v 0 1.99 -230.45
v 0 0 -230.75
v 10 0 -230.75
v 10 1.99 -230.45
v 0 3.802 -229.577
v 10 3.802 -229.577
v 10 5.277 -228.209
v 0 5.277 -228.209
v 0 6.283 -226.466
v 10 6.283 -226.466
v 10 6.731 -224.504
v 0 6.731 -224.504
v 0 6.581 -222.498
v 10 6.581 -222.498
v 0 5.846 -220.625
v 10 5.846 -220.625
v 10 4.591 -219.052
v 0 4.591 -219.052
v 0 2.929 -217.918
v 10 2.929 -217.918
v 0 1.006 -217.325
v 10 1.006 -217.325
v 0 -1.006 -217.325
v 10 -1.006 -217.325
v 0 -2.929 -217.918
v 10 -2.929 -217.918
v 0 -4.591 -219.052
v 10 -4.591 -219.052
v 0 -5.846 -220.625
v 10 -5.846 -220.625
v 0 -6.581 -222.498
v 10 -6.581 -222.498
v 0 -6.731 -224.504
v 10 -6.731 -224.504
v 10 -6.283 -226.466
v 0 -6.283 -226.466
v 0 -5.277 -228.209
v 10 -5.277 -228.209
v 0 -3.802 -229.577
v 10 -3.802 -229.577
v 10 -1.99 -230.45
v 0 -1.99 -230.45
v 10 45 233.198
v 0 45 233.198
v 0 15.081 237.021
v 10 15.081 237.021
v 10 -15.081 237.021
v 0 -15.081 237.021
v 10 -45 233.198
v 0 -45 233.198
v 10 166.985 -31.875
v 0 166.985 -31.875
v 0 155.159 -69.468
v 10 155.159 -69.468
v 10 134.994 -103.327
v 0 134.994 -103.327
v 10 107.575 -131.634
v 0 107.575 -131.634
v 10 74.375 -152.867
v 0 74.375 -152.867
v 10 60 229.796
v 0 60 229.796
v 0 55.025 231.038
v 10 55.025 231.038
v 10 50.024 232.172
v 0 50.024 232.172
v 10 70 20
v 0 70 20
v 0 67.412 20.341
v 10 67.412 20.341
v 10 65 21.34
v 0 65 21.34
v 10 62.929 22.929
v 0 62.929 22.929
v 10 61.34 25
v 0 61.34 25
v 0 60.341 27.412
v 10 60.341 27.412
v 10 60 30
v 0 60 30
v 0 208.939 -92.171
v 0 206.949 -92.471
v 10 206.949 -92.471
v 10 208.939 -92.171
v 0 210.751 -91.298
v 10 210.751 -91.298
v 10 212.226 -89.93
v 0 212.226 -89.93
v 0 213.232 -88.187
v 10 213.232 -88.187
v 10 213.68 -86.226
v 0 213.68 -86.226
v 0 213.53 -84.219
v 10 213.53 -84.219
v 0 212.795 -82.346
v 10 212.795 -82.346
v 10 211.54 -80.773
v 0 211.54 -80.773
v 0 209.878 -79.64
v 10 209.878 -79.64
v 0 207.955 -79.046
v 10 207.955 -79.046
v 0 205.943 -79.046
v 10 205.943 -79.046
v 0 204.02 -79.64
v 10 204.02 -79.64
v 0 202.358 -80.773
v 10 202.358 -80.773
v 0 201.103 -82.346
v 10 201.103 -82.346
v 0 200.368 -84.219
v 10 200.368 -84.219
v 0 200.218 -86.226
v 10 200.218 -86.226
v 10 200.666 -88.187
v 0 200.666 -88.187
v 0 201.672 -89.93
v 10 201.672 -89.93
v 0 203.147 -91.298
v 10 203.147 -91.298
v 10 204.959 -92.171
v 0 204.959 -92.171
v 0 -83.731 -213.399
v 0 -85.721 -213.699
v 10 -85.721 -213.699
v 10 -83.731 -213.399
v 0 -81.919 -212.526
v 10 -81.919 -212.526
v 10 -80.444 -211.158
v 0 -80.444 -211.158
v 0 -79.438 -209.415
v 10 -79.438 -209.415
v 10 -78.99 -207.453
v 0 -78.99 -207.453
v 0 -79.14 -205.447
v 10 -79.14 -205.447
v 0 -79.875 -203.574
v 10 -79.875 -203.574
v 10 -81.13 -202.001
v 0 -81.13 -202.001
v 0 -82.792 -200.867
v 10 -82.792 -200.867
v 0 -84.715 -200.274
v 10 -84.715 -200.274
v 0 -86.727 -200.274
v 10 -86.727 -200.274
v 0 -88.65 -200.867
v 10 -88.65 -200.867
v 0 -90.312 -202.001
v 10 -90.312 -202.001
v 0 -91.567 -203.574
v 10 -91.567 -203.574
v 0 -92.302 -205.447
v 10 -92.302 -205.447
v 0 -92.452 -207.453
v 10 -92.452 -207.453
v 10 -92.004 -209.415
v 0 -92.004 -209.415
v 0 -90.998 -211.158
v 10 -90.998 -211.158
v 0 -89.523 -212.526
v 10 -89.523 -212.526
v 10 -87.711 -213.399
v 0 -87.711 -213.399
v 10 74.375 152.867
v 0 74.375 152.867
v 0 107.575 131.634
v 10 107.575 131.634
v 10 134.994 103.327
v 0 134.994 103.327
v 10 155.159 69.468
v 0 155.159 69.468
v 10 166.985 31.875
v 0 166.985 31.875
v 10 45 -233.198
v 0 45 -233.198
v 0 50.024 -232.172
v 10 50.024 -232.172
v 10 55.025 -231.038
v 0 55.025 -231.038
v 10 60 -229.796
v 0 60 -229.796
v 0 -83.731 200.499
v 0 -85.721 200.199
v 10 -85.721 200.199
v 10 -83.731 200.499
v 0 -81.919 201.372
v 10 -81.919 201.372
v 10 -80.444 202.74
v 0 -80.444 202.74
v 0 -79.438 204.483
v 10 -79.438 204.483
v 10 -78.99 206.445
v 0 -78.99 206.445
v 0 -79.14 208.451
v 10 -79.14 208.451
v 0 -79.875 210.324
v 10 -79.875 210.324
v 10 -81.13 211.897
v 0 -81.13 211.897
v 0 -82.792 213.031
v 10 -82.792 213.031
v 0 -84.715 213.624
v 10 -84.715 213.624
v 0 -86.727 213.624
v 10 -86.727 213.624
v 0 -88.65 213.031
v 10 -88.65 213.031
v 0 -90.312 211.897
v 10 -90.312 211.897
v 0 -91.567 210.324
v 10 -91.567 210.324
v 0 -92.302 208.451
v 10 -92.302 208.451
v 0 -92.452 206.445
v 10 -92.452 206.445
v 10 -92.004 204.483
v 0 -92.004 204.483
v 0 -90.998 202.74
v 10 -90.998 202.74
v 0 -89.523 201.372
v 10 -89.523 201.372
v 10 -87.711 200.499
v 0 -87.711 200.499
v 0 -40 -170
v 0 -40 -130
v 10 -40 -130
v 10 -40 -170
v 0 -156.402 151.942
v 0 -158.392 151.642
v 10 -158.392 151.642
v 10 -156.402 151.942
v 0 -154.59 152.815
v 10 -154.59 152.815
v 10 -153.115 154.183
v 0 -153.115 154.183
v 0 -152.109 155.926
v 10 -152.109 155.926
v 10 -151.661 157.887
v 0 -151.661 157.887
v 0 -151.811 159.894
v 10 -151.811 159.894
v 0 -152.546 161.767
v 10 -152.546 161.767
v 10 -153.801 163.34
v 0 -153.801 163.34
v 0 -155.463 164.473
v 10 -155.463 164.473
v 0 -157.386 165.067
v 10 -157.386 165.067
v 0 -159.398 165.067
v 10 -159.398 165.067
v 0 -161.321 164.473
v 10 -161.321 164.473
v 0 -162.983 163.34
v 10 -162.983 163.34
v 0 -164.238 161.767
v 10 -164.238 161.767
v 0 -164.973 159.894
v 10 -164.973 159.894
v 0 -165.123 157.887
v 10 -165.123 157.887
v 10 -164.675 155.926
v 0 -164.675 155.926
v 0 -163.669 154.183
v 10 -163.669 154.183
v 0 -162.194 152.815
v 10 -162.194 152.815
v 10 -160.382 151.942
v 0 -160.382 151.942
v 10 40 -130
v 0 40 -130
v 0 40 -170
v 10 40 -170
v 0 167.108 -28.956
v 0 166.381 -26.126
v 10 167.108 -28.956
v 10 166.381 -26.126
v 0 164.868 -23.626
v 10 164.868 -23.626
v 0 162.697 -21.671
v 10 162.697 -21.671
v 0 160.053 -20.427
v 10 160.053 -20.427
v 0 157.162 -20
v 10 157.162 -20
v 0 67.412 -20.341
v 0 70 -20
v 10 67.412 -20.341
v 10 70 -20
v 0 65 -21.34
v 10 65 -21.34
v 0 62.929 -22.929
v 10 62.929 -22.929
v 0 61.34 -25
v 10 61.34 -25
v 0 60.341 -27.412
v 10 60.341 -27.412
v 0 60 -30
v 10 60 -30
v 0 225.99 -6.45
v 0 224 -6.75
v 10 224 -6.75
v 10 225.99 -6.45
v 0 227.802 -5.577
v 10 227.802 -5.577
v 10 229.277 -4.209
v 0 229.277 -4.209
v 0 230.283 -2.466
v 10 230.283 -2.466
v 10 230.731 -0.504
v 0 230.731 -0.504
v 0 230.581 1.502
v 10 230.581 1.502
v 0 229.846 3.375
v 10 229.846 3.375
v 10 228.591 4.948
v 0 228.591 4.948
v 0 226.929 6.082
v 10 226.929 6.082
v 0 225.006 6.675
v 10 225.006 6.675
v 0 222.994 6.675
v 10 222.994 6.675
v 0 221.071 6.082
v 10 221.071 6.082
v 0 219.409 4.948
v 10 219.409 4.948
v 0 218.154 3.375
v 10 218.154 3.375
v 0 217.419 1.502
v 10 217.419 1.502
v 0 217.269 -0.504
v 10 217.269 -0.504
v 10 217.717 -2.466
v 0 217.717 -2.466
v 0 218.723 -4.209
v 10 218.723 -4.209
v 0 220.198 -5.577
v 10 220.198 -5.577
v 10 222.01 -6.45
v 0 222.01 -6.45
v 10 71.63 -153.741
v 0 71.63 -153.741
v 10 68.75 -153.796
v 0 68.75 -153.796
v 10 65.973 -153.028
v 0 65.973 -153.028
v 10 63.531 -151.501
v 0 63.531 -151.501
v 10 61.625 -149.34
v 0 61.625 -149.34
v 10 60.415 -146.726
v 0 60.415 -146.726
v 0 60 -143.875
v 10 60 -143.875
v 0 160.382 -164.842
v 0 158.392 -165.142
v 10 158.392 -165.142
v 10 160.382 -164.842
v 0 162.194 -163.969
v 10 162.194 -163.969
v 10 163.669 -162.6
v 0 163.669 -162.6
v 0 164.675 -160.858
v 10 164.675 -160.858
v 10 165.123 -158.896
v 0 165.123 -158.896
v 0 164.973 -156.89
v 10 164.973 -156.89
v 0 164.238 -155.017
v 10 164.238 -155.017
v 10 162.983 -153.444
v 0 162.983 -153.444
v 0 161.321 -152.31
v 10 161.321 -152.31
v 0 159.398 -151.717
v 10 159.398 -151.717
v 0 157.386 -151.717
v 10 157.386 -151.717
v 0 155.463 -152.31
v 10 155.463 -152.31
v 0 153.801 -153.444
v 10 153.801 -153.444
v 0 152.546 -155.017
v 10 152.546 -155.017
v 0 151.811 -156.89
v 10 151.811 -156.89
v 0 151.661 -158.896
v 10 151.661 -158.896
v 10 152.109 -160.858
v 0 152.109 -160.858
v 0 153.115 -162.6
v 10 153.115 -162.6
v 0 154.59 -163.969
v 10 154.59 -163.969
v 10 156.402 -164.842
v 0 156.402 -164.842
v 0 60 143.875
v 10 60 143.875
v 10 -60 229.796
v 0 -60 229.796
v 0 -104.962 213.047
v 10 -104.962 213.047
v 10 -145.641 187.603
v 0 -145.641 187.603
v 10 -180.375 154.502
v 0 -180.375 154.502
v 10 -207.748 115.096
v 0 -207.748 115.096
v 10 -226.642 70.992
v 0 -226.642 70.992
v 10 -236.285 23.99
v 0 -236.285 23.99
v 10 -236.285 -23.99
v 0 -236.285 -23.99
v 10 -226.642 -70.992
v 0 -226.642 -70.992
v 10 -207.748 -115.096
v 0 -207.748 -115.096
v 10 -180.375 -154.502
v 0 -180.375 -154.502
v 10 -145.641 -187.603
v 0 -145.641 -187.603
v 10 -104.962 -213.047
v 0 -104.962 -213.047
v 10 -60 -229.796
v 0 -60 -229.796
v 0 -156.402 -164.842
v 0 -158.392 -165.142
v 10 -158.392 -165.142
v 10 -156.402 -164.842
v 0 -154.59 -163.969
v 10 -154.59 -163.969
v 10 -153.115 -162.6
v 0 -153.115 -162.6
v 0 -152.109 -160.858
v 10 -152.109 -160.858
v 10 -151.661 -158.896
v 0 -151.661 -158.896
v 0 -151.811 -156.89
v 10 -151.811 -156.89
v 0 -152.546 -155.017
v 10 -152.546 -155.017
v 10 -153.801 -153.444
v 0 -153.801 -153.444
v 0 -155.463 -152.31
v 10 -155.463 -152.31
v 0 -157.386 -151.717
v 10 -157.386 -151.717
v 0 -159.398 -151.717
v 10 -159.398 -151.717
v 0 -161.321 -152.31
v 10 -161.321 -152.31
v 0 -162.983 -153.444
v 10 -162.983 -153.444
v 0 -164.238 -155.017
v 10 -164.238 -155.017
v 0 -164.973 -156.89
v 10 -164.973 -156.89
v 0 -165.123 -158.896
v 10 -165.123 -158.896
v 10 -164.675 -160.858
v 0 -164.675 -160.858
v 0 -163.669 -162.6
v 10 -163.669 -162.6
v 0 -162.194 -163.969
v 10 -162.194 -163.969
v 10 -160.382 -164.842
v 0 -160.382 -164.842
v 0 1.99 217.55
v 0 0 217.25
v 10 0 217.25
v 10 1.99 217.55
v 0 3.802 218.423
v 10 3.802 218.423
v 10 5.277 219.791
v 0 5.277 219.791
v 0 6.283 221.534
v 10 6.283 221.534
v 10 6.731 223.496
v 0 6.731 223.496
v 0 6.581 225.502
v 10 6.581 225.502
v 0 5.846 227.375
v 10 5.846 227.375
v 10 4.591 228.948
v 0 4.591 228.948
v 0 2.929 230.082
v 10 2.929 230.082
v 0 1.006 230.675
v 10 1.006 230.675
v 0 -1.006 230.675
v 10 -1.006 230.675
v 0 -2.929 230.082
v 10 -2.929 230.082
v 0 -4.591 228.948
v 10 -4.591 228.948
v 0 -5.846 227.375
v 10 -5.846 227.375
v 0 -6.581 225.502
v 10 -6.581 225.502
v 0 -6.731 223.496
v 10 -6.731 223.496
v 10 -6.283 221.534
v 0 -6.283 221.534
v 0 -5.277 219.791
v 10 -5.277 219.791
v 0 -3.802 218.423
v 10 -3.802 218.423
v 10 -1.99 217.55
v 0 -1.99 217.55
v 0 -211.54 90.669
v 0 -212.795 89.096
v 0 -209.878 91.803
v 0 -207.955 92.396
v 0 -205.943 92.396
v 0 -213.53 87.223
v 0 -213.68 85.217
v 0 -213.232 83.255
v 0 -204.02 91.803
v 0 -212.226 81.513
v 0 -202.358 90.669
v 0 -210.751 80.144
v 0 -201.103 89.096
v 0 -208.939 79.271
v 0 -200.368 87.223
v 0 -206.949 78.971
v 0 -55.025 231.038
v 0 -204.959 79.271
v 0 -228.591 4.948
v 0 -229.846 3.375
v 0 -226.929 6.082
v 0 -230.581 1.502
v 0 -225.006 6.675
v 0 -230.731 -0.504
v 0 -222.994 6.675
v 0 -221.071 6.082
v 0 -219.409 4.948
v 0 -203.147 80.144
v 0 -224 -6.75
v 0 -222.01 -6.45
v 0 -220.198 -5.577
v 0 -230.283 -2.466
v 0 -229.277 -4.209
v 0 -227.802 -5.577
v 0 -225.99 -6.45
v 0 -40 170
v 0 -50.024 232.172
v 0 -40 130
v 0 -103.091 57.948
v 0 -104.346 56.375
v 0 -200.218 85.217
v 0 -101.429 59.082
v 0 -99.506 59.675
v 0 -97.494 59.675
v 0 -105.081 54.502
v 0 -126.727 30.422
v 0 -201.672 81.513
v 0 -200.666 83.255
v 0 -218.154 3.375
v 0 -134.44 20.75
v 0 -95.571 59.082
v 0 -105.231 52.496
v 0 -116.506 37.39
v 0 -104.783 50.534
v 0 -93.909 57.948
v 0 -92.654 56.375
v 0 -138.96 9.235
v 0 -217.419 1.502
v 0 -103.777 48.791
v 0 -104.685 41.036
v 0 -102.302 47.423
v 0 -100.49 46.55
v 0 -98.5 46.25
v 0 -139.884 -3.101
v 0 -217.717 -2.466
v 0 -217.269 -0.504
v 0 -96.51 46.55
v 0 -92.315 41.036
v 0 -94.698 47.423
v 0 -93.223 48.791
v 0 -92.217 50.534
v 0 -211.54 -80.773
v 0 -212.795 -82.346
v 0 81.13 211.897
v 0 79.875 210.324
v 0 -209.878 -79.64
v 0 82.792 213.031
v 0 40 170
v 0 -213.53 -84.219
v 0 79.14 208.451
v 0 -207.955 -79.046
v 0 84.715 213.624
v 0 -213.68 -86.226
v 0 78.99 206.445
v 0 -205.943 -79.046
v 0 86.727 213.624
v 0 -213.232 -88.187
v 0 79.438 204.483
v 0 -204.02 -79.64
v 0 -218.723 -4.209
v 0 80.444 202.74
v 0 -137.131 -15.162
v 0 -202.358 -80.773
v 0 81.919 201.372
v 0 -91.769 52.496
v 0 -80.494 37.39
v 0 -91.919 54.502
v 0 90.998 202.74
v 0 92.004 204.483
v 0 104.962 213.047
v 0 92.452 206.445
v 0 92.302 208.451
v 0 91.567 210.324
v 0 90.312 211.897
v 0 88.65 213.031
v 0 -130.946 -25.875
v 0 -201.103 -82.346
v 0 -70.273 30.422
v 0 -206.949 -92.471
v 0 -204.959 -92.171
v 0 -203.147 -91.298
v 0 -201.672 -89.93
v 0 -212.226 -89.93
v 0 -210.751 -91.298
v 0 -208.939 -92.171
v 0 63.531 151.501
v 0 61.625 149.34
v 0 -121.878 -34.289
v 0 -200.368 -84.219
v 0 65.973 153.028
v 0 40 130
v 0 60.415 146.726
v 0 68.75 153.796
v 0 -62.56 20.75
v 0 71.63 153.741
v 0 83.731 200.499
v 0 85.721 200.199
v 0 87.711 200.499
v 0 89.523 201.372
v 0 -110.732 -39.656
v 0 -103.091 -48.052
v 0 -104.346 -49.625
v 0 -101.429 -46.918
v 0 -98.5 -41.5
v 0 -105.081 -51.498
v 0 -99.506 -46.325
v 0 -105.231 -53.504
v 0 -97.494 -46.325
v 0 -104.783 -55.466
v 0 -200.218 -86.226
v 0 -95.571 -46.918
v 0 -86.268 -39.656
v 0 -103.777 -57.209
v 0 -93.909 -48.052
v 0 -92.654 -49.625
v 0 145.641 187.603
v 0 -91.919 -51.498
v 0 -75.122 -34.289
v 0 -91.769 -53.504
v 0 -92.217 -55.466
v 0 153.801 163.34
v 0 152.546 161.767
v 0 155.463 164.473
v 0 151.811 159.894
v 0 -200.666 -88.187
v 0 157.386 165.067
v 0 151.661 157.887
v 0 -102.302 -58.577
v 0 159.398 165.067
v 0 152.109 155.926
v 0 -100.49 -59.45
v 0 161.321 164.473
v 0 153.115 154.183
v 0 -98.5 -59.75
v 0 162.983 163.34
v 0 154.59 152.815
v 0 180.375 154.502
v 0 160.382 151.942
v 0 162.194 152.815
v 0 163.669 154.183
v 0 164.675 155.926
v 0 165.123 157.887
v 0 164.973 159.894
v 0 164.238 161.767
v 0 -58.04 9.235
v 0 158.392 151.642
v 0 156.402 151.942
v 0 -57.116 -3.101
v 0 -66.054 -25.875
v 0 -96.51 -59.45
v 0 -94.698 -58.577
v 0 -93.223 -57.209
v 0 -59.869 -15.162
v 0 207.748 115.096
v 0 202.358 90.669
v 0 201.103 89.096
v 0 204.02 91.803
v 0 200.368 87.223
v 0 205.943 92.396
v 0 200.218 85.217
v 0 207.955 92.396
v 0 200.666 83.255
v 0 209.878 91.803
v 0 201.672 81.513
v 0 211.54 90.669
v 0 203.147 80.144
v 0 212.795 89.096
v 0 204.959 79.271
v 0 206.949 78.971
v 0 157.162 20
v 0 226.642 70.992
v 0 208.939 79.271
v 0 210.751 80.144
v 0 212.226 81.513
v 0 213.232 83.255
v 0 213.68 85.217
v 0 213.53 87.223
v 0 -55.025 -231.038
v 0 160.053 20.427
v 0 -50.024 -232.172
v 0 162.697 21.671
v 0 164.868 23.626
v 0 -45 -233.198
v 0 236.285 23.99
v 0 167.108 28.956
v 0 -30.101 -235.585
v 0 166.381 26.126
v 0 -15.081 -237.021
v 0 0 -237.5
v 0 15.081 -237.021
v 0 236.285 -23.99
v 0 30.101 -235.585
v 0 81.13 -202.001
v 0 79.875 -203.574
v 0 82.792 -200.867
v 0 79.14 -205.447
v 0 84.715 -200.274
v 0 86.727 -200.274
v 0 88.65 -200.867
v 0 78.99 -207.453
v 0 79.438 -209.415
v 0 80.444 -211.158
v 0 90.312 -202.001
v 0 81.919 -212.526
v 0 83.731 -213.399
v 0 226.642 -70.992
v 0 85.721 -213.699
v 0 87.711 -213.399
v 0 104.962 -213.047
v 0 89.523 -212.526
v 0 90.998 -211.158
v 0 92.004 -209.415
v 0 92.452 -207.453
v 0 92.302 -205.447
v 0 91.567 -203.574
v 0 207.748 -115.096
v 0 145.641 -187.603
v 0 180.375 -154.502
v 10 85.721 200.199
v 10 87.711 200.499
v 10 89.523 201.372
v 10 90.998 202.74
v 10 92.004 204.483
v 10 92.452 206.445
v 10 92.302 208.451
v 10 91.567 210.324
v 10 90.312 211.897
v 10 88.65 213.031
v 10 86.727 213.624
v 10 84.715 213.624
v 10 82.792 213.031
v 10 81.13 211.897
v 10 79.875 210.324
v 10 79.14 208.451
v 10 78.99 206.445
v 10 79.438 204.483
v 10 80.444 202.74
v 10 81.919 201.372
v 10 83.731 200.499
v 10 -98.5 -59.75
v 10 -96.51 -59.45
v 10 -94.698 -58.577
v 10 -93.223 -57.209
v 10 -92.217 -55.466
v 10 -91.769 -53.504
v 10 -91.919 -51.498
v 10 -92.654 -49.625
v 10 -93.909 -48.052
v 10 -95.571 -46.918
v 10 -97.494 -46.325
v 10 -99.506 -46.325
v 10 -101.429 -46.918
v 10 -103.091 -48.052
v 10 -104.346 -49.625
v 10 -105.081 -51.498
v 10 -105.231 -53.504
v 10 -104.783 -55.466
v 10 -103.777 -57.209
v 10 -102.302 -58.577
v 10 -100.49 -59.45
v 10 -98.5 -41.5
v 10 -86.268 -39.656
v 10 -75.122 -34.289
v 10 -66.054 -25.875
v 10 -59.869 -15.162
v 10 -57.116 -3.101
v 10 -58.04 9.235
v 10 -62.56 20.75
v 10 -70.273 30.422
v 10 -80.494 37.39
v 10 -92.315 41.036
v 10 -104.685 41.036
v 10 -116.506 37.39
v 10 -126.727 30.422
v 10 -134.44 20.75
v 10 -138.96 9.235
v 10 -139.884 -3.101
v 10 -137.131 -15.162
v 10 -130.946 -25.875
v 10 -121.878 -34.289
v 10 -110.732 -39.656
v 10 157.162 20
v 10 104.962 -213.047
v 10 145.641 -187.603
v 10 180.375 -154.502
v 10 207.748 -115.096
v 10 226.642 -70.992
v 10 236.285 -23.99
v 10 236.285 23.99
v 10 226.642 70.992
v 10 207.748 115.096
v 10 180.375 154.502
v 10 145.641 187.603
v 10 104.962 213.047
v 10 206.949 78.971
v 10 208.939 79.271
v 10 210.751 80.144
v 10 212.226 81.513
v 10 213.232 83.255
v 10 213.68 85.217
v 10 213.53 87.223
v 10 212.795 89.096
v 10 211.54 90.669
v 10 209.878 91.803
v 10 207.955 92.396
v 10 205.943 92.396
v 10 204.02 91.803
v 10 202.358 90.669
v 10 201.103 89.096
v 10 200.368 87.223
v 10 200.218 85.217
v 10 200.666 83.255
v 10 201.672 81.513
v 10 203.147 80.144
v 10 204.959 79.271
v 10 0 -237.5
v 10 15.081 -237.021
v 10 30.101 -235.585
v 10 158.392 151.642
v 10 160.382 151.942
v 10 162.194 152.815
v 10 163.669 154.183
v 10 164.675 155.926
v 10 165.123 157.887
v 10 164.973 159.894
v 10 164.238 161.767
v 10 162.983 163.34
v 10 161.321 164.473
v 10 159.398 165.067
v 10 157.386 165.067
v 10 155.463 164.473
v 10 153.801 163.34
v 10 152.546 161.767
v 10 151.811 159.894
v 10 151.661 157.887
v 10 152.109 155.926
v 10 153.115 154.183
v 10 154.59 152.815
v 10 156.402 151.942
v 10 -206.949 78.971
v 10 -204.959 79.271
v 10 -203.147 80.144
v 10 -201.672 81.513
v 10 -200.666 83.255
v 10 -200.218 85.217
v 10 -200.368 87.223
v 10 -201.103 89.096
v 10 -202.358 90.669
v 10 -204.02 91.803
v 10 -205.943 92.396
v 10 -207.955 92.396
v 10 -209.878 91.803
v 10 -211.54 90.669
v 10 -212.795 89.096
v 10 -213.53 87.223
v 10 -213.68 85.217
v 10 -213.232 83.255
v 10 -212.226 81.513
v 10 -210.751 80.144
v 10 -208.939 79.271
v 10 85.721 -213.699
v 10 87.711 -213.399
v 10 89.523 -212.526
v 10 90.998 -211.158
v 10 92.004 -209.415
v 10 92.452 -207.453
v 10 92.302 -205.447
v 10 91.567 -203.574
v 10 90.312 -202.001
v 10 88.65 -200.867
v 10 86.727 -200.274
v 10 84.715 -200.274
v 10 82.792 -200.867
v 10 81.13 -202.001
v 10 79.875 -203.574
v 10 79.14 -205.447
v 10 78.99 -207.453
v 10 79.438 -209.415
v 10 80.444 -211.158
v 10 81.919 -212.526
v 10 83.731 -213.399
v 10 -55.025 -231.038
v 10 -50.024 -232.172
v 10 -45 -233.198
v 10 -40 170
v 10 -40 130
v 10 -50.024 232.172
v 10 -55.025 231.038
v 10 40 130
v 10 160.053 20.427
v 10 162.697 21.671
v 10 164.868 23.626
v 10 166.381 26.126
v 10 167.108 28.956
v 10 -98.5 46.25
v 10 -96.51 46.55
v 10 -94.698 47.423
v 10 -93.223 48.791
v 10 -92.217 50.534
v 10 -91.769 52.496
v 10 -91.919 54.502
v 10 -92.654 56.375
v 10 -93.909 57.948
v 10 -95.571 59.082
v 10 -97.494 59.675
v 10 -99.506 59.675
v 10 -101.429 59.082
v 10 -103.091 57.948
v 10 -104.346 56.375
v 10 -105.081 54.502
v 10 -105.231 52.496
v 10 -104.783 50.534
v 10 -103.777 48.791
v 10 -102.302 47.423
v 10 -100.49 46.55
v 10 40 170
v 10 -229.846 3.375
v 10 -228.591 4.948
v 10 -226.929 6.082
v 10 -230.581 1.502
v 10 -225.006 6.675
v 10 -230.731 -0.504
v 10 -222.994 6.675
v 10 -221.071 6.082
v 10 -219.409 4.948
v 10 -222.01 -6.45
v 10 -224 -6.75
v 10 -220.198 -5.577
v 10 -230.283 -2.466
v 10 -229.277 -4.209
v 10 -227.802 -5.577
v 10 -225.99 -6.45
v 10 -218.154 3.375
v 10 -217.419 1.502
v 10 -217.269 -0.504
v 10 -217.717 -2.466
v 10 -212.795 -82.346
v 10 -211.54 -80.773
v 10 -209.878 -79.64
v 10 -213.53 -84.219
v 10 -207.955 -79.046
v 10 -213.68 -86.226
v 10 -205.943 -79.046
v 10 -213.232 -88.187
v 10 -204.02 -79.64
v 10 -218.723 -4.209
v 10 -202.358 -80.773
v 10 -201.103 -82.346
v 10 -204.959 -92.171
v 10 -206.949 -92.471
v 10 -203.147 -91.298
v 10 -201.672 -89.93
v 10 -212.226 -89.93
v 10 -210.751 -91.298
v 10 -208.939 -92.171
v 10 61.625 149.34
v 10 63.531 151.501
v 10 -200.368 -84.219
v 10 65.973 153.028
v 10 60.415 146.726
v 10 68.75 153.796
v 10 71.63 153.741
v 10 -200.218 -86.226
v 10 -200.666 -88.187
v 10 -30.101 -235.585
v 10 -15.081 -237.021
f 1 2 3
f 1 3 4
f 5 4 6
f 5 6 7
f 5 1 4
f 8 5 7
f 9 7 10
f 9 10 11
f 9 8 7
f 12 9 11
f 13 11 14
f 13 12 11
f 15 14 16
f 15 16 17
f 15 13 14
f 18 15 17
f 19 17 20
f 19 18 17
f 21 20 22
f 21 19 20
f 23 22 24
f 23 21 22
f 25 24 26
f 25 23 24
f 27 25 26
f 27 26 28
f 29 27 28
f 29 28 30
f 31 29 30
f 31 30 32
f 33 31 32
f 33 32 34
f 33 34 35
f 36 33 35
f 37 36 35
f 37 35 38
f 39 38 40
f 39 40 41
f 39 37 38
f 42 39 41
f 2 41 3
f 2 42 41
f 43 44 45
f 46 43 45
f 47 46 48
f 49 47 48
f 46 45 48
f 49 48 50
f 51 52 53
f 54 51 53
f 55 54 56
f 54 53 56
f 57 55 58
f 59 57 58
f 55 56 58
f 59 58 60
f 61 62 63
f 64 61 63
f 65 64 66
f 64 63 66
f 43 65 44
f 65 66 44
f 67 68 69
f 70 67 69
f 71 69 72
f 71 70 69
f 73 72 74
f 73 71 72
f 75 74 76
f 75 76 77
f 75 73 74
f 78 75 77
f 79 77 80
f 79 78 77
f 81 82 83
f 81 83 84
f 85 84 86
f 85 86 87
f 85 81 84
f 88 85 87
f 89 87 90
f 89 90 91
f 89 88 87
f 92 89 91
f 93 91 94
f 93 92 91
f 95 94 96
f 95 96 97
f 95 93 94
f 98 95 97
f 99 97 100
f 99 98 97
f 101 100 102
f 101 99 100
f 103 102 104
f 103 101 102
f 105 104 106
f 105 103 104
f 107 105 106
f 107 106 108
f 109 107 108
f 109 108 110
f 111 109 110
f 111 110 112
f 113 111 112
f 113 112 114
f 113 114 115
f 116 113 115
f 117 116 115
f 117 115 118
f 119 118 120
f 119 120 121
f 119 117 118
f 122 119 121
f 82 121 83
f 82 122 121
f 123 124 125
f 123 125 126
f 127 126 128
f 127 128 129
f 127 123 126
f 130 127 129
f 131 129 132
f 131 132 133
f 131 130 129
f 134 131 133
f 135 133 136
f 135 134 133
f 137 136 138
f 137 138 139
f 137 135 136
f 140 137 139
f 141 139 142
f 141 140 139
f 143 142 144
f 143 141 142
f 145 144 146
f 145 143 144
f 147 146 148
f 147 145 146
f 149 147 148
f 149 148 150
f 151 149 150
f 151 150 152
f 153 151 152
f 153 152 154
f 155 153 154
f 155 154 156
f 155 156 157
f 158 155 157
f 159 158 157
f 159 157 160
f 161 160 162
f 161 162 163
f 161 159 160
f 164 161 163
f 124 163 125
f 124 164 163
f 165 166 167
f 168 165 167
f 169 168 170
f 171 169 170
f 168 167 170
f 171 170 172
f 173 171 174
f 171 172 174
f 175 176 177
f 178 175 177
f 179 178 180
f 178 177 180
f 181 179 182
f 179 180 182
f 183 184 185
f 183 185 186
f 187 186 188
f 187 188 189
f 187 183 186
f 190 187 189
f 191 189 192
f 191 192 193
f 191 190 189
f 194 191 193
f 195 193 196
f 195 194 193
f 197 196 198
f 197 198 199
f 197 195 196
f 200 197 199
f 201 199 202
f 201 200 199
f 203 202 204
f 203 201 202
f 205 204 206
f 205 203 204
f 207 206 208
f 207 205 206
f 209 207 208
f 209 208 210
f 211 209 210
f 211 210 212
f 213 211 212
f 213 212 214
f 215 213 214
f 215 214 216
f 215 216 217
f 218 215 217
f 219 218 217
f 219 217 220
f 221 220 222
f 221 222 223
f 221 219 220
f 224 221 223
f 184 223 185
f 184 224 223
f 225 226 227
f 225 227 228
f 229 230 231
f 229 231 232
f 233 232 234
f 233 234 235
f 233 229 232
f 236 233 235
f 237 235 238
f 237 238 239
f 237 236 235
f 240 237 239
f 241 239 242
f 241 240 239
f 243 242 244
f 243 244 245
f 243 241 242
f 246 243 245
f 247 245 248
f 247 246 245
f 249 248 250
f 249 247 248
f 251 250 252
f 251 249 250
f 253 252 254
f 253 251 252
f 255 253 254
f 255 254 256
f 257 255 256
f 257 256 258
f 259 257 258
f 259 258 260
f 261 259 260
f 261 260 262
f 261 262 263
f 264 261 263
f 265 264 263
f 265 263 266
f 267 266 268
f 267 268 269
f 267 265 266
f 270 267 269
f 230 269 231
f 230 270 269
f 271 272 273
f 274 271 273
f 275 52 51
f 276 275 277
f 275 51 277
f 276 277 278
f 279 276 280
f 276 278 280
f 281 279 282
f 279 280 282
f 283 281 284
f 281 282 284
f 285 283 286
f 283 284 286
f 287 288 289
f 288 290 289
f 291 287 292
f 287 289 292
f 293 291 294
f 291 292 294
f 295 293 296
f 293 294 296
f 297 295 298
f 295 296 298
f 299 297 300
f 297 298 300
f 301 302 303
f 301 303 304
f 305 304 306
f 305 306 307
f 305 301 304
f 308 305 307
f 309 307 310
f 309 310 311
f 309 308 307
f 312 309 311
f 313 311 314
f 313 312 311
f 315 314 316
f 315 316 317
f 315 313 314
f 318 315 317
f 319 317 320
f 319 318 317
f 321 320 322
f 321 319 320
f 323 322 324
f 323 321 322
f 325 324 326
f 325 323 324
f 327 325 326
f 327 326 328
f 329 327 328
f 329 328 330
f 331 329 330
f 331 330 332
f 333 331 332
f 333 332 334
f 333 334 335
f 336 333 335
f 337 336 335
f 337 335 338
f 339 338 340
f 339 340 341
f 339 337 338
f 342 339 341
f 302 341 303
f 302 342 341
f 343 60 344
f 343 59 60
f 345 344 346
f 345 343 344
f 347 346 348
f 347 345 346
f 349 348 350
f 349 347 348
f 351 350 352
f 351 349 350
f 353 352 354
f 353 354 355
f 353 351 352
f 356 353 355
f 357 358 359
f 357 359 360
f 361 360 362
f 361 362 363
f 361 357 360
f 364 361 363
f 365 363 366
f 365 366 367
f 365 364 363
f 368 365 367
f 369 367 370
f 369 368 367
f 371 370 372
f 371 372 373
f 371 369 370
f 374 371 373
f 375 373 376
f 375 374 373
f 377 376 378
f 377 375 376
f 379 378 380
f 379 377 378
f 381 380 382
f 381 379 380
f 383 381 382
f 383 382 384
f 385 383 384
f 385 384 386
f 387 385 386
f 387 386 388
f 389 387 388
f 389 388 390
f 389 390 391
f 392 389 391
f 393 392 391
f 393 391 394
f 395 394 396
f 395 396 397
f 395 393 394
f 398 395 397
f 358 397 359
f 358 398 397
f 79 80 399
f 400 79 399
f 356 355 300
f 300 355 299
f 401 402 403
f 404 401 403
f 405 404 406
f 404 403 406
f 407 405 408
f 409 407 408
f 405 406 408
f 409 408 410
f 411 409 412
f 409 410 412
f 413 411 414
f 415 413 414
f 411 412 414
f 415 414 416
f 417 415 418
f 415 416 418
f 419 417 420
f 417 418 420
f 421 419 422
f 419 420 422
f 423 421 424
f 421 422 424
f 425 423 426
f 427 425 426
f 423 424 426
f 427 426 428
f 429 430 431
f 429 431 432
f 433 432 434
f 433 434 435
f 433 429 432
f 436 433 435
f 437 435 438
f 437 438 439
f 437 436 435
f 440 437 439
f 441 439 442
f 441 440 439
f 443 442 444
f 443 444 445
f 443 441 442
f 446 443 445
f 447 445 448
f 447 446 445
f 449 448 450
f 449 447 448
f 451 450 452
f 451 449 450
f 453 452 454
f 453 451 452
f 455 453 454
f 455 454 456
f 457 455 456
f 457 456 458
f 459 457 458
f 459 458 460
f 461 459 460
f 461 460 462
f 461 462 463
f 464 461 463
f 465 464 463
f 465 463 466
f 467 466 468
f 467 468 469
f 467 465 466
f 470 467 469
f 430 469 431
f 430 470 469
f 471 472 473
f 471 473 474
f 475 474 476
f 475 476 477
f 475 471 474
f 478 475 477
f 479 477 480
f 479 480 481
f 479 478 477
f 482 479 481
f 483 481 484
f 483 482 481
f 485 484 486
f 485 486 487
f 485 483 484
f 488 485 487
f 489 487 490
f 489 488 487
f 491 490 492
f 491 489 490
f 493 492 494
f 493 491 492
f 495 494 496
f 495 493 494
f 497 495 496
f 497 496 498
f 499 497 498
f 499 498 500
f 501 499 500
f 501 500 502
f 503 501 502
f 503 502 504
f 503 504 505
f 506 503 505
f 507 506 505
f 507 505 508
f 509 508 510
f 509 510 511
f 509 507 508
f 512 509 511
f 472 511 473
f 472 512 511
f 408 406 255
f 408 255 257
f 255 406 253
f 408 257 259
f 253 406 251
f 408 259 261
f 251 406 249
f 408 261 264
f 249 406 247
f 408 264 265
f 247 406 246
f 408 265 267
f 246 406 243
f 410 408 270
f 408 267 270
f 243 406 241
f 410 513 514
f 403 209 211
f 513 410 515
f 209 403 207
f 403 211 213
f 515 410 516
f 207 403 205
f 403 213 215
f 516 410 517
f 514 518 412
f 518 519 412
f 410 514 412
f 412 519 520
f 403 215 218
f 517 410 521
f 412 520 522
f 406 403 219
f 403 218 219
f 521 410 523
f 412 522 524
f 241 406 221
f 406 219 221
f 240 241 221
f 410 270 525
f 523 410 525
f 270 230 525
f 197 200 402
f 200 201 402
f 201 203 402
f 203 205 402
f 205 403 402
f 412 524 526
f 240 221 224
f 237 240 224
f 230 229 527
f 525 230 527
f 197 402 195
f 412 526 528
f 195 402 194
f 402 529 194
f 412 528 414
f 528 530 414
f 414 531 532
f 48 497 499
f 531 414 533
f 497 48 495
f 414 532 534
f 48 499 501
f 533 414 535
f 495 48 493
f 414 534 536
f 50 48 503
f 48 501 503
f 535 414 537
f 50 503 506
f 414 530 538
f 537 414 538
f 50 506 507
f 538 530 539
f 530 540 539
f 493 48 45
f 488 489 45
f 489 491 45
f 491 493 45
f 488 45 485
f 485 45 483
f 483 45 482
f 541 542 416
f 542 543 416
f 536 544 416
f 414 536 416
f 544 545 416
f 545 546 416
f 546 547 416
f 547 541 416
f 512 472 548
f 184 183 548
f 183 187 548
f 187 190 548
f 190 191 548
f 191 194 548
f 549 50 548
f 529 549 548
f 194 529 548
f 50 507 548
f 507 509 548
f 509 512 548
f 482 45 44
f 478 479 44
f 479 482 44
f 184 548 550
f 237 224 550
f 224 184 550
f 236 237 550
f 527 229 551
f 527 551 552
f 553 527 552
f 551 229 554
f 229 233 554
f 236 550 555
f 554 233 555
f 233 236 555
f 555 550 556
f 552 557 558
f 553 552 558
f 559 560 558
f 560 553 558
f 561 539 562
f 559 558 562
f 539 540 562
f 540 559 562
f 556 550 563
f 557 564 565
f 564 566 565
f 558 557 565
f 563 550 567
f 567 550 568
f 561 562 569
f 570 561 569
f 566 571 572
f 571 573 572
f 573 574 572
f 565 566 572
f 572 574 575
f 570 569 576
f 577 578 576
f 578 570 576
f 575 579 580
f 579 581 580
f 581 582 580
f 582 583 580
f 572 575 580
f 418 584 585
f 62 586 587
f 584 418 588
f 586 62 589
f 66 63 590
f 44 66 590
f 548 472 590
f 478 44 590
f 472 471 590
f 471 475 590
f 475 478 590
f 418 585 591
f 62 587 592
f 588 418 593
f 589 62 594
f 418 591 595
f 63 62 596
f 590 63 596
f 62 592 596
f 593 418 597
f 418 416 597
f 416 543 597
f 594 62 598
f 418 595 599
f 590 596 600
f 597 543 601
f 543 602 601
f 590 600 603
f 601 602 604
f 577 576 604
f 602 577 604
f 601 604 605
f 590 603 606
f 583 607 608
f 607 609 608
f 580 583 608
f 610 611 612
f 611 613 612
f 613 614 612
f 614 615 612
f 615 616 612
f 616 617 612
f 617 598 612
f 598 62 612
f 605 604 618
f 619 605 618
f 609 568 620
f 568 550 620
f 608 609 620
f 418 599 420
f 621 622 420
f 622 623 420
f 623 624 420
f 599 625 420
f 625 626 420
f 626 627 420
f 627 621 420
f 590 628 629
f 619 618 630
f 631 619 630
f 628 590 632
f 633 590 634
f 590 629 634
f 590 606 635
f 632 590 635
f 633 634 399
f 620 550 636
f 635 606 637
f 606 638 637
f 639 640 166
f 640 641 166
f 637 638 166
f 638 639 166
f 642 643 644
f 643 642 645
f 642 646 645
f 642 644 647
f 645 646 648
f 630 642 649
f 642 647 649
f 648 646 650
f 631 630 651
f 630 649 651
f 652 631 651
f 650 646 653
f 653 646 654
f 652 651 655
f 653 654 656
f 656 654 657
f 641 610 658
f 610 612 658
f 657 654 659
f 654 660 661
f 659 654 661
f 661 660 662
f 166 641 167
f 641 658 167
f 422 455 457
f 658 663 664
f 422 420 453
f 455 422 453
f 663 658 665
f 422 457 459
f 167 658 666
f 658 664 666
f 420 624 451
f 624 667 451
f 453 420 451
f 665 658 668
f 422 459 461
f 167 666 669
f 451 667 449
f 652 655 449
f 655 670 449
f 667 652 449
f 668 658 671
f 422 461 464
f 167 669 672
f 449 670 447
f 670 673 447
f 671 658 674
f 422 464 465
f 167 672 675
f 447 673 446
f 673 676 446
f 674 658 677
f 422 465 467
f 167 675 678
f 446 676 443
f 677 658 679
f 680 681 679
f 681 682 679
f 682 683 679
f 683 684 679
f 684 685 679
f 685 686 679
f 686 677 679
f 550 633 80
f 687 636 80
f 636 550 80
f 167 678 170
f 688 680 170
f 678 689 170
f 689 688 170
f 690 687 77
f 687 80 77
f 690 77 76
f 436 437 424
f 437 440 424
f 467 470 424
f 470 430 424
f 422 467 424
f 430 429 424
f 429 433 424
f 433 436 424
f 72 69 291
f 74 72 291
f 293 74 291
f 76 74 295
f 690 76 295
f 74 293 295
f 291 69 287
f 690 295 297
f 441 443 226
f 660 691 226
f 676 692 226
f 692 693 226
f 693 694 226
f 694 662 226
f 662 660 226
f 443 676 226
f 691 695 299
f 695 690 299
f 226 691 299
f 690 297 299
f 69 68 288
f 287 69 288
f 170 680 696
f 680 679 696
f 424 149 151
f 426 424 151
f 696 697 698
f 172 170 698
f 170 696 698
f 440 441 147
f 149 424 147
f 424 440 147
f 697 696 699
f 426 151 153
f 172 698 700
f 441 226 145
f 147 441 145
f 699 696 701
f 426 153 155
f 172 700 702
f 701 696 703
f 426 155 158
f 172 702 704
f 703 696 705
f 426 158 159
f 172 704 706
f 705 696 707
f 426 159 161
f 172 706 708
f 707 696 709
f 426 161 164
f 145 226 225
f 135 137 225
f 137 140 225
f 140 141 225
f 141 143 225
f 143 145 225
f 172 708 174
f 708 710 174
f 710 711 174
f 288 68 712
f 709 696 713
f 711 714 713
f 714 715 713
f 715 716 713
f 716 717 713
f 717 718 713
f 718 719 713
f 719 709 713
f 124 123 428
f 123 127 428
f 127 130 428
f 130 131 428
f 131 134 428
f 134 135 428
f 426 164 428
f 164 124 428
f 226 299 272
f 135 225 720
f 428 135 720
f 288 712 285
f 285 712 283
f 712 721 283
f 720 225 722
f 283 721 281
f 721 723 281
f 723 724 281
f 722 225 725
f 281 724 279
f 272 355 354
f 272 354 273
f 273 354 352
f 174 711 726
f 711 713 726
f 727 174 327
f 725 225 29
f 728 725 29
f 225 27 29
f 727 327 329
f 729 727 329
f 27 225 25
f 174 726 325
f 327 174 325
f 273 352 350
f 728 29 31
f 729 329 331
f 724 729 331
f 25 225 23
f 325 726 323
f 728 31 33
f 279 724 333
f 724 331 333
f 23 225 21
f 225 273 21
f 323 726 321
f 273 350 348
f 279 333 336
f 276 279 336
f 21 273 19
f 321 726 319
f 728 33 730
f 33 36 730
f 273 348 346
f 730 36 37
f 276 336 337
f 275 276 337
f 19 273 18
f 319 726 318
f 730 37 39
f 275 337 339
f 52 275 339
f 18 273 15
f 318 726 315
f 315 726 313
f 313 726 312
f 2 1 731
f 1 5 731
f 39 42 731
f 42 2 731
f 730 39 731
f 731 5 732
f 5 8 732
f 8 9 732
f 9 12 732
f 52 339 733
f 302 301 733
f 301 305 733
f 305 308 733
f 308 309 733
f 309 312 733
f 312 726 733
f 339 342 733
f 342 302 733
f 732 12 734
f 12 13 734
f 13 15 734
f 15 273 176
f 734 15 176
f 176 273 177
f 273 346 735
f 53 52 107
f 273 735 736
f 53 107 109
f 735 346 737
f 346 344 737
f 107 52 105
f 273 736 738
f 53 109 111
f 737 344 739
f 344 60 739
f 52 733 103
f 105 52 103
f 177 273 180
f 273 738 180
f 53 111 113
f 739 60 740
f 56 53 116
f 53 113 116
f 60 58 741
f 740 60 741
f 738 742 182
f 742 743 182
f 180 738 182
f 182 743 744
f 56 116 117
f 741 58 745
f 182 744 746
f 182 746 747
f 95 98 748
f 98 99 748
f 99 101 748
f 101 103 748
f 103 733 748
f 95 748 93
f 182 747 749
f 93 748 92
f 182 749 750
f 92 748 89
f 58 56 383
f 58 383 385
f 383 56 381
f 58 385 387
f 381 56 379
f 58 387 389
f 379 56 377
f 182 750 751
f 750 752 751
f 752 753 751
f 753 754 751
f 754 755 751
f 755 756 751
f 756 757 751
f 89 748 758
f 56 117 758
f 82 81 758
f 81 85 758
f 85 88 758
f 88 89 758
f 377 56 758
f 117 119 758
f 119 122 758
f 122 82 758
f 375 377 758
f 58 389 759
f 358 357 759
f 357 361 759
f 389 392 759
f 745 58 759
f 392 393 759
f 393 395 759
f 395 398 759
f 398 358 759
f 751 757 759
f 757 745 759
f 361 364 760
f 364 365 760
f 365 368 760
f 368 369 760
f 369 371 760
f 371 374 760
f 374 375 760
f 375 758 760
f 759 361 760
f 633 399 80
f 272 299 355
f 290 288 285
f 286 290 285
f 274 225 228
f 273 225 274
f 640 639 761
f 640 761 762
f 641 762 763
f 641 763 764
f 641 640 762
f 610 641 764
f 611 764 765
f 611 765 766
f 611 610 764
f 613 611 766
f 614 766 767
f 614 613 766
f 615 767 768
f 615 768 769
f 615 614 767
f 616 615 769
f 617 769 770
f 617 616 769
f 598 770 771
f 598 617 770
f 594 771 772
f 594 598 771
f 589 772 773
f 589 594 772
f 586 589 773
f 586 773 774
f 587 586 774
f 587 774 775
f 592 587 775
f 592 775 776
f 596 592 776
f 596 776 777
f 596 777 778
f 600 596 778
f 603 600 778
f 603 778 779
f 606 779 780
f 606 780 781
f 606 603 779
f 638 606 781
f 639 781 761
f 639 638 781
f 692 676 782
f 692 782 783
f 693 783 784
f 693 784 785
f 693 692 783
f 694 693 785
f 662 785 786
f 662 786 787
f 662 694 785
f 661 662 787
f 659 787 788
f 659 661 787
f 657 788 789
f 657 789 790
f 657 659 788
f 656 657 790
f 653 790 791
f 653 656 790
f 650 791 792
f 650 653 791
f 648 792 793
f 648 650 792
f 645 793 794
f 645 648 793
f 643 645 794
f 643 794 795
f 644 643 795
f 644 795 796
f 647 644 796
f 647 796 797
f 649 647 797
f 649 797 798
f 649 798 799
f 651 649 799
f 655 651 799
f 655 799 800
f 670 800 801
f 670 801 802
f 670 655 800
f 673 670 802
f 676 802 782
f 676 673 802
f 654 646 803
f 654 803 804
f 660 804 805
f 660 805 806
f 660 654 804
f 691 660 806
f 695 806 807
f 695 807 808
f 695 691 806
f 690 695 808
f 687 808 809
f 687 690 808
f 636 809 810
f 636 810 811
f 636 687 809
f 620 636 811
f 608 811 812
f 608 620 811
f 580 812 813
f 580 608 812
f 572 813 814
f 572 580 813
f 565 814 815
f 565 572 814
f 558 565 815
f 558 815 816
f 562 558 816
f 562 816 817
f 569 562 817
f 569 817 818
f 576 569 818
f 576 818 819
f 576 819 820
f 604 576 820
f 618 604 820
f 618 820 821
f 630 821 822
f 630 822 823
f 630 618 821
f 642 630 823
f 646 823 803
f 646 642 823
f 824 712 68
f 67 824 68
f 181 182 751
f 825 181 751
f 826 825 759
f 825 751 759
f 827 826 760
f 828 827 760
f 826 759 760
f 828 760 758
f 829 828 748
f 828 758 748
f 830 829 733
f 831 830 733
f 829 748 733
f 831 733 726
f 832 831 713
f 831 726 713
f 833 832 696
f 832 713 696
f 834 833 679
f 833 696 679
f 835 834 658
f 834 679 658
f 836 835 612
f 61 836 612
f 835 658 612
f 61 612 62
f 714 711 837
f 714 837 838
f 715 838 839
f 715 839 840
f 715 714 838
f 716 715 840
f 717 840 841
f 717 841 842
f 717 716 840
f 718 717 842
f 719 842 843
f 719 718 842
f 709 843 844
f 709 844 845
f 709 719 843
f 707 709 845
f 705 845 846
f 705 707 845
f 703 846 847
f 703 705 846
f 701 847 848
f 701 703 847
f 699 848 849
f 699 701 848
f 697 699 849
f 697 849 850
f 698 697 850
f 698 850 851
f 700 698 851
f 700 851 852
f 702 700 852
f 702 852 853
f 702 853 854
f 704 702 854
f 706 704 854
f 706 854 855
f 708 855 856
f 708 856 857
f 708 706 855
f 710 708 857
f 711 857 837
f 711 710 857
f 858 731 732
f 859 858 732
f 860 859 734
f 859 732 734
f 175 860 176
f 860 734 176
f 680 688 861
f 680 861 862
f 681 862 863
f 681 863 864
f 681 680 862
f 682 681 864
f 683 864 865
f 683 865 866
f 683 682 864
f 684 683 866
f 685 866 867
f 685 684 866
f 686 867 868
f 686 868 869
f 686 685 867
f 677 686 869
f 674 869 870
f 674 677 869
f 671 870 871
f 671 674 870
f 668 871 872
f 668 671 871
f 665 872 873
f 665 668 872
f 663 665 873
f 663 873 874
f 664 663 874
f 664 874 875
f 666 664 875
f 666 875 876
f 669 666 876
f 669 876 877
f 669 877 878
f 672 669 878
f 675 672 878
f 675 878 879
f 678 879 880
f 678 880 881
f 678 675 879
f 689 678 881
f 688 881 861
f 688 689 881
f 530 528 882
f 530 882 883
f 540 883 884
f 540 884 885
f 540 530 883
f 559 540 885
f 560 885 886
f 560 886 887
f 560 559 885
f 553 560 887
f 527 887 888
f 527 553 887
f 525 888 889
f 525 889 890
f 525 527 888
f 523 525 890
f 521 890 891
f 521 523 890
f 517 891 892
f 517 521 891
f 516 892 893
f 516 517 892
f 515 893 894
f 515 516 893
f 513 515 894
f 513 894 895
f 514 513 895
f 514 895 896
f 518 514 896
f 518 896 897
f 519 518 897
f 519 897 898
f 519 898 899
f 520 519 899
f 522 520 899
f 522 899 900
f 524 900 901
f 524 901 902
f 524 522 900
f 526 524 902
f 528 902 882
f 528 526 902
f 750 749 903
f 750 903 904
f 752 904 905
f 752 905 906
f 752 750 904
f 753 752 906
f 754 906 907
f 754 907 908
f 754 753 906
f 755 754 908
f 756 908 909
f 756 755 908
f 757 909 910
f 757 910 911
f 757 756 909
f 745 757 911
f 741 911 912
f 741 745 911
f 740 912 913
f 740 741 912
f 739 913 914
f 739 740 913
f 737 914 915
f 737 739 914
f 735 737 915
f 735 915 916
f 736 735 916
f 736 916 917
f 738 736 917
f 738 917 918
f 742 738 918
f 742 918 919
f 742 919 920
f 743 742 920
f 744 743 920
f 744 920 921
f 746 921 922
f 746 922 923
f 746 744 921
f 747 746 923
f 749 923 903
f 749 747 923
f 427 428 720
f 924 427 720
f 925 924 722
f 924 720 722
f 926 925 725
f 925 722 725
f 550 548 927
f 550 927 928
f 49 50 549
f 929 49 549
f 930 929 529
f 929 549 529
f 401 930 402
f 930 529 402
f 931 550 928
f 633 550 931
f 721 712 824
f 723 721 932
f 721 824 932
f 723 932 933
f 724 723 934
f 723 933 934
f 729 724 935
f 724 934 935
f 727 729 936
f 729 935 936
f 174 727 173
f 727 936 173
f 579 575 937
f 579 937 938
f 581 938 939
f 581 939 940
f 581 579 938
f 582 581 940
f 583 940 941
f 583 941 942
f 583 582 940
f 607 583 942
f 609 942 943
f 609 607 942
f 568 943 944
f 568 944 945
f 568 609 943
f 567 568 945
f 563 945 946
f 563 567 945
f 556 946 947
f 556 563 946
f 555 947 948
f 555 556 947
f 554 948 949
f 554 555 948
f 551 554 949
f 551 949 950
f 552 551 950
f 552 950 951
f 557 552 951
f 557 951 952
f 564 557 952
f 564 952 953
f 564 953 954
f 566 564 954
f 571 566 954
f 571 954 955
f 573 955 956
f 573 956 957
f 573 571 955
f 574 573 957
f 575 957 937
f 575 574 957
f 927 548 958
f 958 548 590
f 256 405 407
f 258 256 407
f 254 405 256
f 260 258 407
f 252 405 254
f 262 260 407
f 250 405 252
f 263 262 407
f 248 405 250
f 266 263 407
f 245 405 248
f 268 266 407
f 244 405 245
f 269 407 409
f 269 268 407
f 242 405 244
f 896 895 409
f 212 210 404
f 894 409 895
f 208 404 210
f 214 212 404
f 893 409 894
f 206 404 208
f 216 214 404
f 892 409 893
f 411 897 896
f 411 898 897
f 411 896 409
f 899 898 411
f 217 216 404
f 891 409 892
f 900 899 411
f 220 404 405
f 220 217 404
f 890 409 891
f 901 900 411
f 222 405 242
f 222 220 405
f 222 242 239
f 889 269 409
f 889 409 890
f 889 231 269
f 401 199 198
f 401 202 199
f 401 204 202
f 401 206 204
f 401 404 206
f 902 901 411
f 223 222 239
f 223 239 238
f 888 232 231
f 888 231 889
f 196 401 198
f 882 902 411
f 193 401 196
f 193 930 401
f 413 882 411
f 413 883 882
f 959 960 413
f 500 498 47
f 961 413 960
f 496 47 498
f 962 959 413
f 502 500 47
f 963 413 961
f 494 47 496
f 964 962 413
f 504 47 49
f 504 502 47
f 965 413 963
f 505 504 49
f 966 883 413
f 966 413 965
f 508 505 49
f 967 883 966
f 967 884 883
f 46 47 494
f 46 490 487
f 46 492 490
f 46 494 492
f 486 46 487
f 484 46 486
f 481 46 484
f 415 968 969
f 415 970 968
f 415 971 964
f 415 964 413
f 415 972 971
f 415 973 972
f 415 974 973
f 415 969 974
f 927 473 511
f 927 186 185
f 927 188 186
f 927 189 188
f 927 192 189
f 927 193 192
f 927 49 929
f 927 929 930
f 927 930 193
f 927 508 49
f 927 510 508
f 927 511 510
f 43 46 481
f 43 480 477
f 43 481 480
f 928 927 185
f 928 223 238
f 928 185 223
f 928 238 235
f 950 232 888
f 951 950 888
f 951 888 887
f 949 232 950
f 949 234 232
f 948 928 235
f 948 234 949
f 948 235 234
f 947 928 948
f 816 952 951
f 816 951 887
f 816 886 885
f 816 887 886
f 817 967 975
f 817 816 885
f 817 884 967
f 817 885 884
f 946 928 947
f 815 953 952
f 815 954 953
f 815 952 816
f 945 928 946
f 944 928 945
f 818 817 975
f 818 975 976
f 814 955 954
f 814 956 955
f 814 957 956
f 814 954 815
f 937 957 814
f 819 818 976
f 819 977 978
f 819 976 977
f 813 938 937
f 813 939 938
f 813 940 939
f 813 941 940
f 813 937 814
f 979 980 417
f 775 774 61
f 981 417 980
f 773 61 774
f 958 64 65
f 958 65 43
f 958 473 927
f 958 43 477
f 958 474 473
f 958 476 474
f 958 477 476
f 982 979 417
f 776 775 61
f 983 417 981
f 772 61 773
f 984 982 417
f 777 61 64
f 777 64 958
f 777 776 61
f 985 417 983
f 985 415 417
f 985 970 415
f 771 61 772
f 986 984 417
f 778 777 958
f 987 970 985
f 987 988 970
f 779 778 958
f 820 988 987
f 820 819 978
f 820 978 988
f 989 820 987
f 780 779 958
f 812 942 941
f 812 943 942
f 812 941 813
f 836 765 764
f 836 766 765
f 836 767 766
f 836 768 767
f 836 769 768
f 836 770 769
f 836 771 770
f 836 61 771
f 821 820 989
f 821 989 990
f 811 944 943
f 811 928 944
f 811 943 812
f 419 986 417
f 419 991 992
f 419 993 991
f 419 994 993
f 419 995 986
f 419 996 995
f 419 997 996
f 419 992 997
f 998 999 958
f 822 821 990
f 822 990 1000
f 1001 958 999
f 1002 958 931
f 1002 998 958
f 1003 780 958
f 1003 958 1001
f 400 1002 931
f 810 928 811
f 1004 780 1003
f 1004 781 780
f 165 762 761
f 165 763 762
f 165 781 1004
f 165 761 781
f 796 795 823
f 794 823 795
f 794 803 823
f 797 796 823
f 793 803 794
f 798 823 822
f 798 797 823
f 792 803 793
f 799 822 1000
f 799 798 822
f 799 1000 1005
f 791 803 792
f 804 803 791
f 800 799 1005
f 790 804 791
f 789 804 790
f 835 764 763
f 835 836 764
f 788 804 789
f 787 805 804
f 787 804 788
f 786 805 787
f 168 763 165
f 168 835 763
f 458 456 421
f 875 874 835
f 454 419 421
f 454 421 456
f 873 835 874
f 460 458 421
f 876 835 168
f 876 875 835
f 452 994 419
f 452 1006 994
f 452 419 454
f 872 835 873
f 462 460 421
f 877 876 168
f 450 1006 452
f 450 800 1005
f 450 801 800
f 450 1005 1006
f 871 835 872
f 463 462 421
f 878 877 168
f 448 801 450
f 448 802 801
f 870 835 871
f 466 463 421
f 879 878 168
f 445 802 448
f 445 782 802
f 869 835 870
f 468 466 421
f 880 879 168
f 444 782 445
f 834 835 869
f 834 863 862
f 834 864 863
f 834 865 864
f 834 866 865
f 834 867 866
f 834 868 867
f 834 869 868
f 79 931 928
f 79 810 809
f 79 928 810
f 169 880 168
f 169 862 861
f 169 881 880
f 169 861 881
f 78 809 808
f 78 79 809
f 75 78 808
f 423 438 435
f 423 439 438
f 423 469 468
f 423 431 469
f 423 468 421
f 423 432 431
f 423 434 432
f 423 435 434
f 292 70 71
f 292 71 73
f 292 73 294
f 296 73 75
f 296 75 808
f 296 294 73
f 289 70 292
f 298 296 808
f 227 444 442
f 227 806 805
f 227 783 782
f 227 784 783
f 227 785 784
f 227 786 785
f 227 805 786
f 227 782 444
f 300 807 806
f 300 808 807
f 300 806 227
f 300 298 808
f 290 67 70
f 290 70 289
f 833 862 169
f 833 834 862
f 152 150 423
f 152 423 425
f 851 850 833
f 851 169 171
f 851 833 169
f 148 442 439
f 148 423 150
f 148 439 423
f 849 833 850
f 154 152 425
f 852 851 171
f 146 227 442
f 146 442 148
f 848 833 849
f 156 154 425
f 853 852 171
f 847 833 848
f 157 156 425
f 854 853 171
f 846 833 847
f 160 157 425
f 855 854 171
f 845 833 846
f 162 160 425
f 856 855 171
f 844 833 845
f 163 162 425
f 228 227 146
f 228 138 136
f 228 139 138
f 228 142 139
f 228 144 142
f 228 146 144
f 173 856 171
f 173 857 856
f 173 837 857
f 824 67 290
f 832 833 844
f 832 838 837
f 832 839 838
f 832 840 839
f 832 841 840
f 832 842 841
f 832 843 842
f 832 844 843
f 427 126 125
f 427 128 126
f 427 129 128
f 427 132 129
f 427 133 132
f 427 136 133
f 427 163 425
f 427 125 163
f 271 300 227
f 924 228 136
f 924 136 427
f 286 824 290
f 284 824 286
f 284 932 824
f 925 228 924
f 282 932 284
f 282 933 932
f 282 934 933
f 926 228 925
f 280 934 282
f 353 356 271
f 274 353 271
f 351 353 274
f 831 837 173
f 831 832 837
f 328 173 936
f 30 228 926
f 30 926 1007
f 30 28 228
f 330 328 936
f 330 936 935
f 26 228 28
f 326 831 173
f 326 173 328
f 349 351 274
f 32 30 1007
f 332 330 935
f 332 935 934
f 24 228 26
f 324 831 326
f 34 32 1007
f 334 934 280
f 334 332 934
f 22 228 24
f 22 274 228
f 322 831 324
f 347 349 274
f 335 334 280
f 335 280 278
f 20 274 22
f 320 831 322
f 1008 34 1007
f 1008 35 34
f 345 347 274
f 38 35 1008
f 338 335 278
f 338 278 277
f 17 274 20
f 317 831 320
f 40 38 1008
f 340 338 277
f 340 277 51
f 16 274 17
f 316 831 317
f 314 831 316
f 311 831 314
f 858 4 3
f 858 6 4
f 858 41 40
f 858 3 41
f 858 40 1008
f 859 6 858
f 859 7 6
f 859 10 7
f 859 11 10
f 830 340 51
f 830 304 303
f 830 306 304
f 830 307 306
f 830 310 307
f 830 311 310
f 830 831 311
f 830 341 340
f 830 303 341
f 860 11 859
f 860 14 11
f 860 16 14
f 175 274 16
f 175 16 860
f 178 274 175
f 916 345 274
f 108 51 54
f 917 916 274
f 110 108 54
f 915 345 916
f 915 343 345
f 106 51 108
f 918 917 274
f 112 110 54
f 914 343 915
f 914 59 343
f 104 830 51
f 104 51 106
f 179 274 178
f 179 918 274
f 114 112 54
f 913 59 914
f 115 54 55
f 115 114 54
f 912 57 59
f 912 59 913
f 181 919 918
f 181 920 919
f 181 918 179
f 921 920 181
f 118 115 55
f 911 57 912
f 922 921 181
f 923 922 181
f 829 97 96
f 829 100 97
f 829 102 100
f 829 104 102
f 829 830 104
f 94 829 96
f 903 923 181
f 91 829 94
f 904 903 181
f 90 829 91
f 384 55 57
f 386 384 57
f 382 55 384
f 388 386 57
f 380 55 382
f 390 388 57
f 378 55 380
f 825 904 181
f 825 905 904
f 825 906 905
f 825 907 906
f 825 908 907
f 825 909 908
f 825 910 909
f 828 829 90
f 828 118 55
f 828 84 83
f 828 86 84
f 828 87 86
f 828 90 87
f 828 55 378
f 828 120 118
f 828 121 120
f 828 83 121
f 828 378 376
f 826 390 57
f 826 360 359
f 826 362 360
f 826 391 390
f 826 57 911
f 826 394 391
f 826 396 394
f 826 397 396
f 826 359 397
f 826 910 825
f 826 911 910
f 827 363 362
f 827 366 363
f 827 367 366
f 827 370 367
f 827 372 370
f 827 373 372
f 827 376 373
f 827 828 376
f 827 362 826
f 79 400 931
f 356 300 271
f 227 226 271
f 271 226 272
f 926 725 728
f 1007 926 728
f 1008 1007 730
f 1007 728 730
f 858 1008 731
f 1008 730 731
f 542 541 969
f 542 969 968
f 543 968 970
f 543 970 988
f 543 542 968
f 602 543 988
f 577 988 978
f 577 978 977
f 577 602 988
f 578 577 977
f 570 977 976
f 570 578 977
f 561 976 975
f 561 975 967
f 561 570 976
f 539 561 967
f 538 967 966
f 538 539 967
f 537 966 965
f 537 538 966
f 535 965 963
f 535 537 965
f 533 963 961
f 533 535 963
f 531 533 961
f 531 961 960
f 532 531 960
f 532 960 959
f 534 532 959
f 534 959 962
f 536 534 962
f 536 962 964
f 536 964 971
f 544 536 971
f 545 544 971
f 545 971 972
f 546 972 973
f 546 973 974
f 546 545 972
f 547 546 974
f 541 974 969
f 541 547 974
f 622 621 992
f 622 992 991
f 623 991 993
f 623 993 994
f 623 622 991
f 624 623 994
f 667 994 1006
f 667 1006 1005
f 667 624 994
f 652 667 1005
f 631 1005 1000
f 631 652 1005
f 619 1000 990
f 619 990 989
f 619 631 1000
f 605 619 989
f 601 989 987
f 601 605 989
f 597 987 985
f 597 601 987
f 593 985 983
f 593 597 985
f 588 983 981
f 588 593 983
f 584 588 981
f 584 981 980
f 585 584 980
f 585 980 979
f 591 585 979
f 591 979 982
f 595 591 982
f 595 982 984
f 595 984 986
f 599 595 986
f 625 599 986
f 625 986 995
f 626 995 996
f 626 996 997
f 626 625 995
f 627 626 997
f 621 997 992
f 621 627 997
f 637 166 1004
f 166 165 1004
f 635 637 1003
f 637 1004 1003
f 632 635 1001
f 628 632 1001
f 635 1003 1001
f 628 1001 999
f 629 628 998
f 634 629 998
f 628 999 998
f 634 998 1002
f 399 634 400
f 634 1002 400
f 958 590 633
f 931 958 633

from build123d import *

# Parameters (mm, degrees)
ESQUISSE1_R        = 6.75
ESQUISSE1_R_2      = 41.5
ESQUISSE1_W        = 40
ESQUISSE1_H        = 80
BOSS_EXTRU_1_DEPTH = 10
CONG_1_R           = 10


with BuildPart() as part:
    # Esquisse1 → Boss.-Extru.1 (new body)
    with BuildSketch(Plane(origin=(0, 0, 0), x_dir=(0, 0, -1), z_dir=(1, 0, 0))):
        with BuildLine():
            ThreePointArc((229.796105276, 60), (0, 237.5), (-229.796105276, 60))
            ThreePointArc((-229.796105276, 60), (-231.618451309, 52.527545282), (-233.197877349, 45))
            ThreePointArc((-233.197877349, 45), (-237.5, 0), (-233.197877349, -45))
            ThreePointArc((-233.197877349, -45), (-231.618451309, -52.527545282), (-229.796105276, -60))
            ThreePointArc((-229.796105276, -60), (0, -237.5), (229.796105276, -60))
            ThreePointArc((229.796105276, -60), (231.618451309, -52.527545282), (233.197877349, -45))
            ThreePointArc((233.197877349, -45), (236.422022949, -22.602589781), (237.5, 0))
            ThreePointArc((237.5, 0), (236.422022949, 22.602589781), (233.197877349, 45))
            ThreePointArc((233.197877349, 45), (231.618451309, 52.527545282), (229.796105276, 60))
        make_face()
        with Locations((-158.391918986, -158.391918986)):
            Circle(ESQUISSE1_R, mode=Mode.SUBTRACT)
        with Locations((-85.72108885, -206.949015283)):
            Circle(ESQUISSE1_R, mode=Mode.SUBTRACT)
        with Locations((-206.949015283, -85.72108885)):
            Circle(ESQUISSE1_R, mode=Mode.SUBTRACT)
        with Locations((-224, 0)):
            Circle(ESQUISSE1_R, mode=Mode.SUBTRACT)
        with Locations((-53, -98.5)):
            Circle(ESQUISSE1_R, mode=Mode.SUBTRACT)
        with Locations((0, -224)):
            Circle(ESQUISSE1_R, mode=Mode.SUBTRACT)
        with Locations((85.72108885, -206.949015283)):
            Circle(ESQUISSE1_R, mode=Mode.SUBTRACT)
        with Locations((158.391918986, -158.391918986)):
            Circle(ESQUISSE1_R, mode=Mode.SUBTRACT)
        with Locations((0, -98.5)):
            Circle(ESQUISSE1_R_2, mode=Mode.SUBTRACT)
        with Locations((53, -98.5)):
            Circle(ESQUISSE1_R, mode=Mode.SUBTRACT)
        with Locations((206.949015283, -85.72108885)):
            Circle(ESQUISSE1_R, mode=Mode.SUBTRACT)
        with Locations((-150, 0)):
            Rectangle(ESQUISSE1_W, ESQUISSE1_H, mode=Mode.SUBTRACT)
        with Locations((-206.949015283, 85.72108885)):
            Circle(ESQUISSE1_R, mode=Mode.SUBTRACT)
        with BuildLine():
            Line((-20, 60), (-159.059737206, 60))
            ThreePointArc((-159.059737206, 60), (-104.766475875, 133.880489739), (-20, 168.819430161))
            Line((-20, 168.819430161), (-20, 60))
        make_face(mode=Mode.SUBTRACT)
        with Locations((-158.391918986, 158.391918986)):
            Circle(ESQUISSE1_R, mode=Mode.SUBTRACT)
        with Locations((-85.72108885, 206.949015283)):
            Circle(ESQUISSE1_R, mode=Mode.SUBTRACT)
        with BuildLine():
            Line((159.059737206, 60), (20, 60))
            Line((20, 60), (20, 168.819430161))
            ThreePointArc((20, 168.819430161), (104.766475875, 133.880489739), (159.059737206, 60))
        make_face(mode=Mode.SUBTRACT)
        with Locations((150, 0)):
            Rectangle(ESQUISSE1_W, ESQUISSE1_H, mode=Mode.SUBTRACT)
        with Locations((224, 0)):
            Circle(ESQUISSE1_R, mode=Mode.SUBTRACT)
        with Locations((206.949015283, 85.72108885)):
            Circle(ESQUISSE1_R, mode=Mode.SUBTRACT)
        with Locations((0, 224)):
            Circle(ESQUISSE1_R, mode=Mode.SUBTRACT)
        with Locations((85.72108885, 206.949015283)):
            Circle(ESQUISSE1_R, mode=Mode.SUBTRACT)
        with Locations((158.391918986, 158.391918986)):
            Circle(ESQUISSE1_R, mode=Mode.SUBTRACT)
    extrude(amount=BOSS_EXTRU_1_DEPTH)

    # Cong_1
    cong_1_edges = [part.edges().sort_by_distance(p)[0] for p in [
        (5, 60, -20),
        (5, 60, -159.059737206),
        (5, 168.819430161, -20),
        (5, 60, 159.059737206),
        (5, 60, 20),
        (5, 168.819430161, 20),
    ]]
    fillet(cong_1_edges, radius=CONG_1_R)


solid = part.part
